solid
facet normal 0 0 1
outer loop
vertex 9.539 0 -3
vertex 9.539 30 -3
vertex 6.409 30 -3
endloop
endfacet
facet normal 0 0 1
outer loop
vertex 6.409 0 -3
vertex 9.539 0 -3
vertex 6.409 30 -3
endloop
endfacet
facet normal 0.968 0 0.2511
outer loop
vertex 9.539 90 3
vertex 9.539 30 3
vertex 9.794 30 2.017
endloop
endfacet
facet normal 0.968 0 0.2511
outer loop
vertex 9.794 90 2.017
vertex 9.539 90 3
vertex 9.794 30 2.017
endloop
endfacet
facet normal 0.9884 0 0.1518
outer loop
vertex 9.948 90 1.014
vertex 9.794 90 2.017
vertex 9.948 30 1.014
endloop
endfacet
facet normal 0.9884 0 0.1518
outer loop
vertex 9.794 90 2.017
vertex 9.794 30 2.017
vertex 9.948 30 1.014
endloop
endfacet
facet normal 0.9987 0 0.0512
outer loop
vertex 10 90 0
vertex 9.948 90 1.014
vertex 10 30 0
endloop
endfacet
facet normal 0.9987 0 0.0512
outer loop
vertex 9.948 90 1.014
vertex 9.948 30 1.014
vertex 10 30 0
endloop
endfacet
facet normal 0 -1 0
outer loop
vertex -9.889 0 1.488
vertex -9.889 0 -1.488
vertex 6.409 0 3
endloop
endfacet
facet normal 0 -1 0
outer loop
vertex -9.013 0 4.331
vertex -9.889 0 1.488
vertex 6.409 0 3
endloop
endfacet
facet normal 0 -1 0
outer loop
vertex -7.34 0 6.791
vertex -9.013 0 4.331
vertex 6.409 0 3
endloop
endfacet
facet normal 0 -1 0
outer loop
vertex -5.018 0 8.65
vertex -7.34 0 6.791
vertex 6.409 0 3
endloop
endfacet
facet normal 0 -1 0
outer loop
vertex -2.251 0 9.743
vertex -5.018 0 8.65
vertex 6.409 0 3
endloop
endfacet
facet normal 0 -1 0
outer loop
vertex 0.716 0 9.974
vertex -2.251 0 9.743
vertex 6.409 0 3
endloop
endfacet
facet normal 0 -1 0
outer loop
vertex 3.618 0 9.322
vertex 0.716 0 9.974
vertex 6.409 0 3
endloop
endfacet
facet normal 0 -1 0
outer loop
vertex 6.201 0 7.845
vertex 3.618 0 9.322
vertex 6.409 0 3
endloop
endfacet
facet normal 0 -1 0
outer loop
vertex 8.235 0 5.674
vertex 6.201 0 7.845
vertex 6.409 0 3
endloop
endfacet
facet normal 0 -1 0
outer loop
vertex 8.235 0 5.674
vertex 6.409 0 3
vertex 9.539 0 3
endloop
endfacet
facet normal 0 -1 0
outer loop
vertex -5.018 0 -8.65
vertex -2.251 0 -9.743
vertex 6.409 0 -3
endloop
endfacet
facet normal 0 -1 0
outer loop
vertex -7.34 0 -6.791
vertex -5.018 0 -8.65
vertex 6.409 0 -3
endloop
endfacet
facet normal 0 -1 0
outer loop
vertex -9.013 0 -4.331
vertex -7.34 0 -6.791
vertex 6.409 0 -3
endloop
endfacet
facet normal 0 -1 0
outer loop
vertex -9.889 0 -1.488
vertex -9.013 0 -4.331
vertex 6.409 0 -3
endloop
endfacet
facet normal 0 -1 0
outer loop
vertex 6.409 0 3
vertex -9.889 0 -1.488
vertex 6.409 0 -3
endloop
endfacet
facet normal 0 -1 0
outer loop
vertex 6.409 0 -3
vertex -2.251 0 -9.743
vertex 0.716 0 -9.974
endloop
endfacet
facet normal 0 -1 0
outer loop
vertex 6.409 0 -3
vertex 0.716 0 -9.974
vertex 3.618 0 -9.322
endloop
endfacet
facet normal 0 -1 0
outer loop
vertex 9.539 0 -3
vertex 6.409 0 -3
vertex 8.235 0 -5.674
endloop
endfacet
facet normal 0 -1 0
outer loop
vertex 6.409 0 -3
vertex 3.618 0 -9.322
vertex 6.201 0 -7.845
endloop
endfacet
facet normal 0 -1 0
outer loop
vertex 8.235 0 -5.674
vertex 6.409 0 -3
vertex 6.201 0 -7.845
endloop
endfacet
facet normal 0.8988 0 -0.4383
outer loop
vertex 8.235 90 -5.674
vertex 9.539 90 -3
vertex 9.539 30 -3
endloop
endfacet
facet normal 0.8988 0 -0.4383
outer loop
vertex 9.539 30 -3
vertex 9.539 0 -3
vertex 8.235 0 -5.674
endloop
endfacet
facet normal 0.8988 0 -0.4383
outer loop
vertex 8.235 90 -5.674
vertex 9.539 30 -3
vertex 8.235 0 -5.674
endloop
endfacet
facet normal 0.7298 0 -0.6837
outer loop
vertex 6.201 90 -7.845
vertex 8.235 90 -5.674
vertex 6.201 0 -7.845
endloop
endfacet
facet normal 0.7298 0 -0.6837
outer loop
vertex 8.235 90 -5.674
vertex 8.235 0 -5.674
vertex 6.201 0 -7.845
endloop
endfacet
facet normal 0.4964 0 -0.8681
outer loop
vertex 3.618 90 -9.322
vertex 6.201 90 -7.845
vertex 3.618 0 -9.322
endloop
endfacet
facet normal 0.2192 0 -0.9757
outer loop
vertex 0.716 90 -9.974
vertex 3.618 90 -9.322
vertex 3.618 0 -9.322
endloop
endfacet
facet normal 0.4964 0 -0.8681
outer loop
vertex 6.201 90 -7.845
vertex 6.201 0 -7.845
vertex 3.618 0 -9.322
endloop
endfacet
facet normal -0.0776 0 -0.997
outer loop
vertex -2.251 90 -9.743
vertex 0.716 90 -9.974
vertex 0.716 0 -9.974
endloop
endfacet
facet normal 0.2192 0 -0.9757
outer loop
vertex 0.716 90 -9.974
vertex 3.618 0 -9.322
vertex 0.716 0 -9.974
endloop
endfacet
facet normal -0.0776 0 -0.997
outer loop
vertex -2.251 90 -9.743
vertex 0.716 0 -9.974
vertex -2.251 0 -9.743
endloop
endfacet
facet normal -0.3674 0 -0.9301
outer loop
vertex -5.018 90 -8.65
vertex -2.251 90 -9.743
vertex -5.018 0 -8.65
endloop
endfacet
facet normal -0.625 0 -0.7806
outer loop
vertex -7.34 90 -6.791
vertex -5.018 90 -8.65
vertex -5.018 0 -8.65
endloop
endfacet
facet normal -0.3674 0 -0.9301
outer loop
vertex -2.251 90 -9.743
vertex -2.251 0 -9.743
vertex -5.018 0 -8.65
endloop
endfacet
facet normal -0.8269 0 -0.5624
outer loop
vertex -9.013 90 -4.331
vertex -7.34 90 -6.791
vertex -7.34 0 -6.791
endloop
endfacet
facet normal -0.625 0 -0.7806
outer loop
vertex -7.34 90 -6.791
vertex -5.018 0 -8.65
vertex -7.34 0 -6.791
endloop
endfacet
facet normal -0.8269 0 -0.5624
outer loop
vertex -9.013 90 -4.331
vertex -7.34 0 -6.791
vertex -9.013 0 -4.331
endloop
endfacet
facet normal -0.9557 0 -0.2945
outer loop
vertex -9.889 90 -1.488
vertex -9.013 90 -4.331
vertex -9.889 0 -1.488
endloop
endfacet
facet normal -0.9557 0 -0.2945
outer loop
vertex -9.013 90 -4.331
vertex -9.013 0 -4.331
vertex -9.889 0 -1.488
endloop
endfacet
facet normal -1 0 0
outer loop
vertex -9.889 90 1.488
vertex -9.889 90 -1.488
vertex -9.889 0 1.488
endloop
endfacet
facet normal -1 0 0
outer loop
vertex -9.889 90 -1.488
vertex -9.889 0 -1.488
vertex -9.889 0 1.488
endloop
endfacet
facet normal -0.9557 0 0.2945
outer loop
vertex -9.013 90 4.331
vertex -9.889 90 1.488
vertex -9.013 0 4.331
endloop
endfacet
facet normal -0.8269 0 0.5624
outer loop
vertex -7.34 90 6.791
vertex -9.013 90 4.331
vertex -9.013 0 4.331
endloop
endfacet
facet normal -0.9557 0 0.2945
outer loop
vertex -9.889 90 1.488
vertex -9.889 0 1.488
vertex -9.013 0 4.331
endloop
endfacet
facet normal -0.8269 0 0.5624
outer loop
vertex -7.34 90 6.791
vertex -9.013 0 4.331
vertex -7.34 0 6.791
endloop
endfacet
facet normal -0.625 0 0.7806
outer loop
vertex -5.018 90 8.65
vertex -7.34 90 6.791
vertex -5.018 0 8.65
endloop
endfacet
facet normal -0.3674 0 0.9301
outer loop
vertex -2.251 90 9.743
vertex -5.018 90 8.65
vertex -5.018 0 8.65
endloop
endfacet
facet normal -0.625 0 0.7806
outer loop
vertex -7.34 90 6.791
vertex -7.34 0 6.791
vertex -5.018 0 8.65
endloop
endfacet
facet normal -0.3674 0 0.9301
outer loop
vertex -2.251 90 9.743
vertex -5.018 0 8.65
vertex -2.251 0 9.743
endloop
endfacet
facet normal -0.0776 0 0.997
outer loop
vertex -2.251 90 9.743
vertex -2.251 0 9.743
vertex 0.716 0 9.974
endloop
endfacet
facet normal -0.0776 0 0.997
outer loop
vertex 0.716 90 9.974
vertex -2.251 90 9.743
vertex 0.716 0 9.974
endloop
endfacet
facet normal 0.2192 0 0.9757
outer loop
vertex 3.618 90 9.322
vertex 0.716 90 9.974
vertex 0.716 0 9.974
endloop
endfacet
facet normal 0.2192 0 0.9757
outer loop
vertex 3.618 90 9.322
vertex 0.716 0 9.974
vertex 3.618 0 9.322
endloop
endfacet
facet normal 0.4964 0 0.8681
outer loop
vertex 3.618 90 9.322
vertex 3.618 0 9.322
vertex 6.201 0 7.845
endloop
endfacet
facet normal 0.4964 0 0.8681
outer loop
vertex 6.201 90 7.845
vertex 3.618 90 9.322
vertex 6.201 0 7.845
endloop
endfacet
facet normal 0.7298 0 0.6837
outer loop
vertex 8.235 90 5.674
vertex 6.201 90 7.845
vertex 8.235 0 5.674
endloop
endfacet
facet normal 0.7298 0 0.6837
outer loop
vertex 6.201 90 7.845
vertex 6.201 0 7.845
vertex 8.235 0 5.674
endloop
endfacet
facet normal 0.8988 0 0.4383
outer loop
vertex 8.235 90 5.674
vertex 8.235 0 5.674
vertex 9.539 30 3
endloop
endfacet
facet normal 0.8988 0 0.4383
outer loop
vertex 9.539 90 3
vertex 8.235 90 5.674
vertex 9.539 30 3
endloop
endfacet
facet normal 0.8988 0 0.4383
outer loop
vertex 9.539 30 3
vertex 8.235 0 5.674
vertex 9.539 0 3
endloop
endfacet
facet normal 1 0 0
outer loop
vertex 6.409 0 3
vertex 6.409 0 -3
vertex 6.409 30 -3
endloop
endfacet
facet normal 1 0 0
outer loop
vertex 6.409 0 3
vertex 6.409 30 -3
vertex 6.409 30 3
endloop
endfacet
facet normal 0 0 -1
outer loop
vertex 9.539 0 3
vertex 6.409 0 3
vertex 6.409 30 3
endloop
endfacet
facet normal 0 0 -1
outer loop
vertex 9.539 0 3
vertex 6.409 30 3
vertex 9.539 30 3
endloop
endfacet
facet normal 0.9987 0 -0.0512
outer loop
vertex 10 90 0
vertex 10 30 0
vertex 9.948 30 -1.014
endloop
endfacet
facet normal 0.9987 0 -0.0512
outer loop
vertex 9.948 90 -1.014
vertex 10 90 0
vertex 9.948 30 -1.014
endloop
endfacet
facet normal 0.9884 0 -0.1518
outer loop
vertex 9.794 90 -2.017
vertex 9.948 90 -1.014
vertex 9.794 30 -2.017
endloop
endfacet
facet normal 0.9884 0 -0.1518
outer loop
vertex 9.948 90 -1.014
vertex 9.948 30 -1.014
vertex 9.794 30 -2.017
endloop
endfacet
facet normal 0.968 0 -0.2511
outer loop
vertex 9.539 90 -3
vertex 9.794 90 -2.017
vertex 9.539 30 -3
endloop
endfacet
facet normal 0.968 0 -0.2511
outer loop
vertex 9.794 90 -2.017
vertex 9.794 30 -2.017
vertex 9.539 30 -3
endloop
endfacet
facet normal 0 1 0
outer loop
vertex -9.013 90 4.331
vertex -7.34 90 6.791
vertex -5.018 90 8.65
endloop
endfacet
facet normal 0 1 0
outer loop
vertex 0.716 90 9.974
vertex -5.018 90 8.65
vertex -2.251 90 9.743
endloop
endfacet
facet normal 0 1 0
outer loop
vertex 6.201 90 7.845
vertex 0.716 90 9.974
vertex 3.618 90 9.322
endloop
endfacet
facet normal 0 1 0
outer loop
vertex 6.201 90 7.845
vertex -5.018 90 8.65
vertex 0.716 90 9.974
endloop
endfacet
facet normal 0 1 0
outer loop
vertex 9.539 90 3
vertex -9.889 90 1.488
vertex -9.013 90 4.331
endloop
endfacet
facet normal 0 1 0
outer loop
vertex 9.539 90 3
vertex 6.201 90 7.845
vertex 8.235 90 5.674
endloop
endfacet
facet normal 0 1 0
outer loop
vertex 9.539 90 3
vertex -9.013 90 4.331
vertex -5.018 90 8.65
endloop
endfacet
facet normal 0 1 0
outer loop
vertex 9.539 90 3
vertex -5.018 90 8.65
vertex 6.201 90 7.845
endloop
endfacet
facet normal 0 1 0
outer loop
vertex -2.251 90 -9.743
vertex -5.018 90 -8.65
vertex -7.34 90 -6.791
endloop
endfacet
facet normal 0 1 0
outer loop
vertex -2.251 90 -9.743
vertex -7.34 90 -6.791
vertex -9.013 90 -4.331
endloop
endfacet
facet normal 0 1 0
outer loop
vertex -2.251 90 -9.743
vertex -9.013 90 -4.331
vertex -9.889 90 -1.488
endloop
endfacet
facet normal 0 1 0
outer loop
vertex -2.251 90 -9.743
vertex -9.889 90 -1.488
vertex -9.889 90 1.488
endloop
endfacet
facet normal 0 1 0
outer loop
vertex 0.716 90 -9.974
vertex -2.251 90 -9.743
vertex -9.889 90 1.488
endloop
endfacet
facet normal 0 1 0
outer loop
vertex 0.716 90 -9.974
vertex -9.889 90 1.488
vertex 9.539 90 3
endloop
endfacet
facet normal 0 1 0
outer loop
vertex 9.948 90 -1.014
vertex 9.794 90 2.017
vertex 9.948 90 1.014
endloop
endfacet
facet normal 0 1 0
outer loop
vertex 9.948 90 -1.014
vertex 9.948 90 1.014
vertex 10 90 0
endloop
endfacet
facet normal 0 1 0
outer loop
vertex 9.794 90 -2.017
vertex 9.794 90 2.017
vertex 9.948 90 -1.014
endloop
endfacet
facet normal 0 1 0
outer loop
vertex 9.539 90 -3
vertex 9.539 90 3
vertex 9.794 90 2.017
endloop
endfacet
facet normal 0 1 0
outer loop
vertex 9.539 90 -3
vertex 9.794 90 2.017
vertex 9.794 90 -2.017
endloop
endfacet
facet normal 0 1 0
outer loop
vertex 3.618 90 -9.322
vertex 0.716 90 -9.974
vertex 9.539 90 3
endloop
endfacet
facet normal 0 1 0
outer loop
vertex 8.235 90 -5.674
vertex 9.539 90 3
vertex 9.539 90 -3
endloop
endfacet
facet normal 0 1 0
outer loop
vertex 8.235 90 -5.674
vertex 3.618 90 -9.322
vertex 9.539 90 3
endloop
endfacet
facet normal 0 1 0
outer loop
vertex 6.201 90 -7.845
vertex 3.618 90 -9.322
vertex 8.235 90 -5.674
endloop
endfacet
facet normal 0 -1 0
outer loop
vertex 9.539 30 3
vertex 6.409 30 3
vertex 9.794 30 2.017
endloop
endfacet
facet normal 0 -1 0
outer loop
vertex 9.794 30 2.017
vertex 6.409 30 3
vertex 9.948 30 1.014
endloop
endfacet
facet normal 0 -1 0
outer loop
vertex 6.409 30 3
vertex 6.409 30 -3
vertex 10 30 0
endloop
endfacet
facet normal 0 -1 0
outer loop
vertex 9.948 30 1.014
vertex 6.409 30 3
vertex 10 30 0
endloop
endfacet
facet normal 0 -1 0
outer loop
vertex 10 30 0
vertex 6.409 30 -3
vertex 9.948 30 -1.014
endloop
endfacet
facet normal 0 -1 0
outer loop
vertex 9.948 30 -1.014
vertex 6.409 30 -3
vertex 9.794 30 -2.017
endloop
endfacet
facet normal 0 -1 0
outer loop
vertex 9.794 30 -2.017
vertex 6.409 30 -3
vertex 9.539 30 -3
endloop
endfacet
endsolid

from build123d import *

# Parameters (mm, degrees)
SKETCH1_R           = 10
BOSS_EXTRUDE1_DEPTH = 90
CUT_EXTRUDE1_DEPTH  = 30


with BuildPart() as part:
    # Sketch1 → Boss-Extrude1 (new body)
    with BuildSketch(Plane(origin=(0, 0, 0), x_dir=(1, 0, 0), z_dir=(0, 1, 0))):
        Circle(SKETCH1_R)
    extrude(amount=BOSS_EXTRUDE1_DEPTH)

    # Sketch1_3 → Cut-Extrude1 (cut)
    with BuildSketch(Plane(origin=(0, 0, 0), x_dir=(1, 0, 0), z_dir=(0, 1, 0))):
        with BuildLine():
            Line((9.539392014, 3), (6.409392014, 3))
            Line((6.409392014, 3), (6.409392014, -3))
            Line((6.409392014, -3), (9.539392014, -3))
            ThreePointArc((9.539392014, -3), (9.884177258, -1.517576993), (10, 0))
            ThreePointArc((10, 0), (9.884177258, 1.517576993), (9.539392014, 3))
        make_face()
    extrude(amount=CUT_EXTRUDE1_DEPTH, mode=Mode.SUBTRACT)


solid = part.part
